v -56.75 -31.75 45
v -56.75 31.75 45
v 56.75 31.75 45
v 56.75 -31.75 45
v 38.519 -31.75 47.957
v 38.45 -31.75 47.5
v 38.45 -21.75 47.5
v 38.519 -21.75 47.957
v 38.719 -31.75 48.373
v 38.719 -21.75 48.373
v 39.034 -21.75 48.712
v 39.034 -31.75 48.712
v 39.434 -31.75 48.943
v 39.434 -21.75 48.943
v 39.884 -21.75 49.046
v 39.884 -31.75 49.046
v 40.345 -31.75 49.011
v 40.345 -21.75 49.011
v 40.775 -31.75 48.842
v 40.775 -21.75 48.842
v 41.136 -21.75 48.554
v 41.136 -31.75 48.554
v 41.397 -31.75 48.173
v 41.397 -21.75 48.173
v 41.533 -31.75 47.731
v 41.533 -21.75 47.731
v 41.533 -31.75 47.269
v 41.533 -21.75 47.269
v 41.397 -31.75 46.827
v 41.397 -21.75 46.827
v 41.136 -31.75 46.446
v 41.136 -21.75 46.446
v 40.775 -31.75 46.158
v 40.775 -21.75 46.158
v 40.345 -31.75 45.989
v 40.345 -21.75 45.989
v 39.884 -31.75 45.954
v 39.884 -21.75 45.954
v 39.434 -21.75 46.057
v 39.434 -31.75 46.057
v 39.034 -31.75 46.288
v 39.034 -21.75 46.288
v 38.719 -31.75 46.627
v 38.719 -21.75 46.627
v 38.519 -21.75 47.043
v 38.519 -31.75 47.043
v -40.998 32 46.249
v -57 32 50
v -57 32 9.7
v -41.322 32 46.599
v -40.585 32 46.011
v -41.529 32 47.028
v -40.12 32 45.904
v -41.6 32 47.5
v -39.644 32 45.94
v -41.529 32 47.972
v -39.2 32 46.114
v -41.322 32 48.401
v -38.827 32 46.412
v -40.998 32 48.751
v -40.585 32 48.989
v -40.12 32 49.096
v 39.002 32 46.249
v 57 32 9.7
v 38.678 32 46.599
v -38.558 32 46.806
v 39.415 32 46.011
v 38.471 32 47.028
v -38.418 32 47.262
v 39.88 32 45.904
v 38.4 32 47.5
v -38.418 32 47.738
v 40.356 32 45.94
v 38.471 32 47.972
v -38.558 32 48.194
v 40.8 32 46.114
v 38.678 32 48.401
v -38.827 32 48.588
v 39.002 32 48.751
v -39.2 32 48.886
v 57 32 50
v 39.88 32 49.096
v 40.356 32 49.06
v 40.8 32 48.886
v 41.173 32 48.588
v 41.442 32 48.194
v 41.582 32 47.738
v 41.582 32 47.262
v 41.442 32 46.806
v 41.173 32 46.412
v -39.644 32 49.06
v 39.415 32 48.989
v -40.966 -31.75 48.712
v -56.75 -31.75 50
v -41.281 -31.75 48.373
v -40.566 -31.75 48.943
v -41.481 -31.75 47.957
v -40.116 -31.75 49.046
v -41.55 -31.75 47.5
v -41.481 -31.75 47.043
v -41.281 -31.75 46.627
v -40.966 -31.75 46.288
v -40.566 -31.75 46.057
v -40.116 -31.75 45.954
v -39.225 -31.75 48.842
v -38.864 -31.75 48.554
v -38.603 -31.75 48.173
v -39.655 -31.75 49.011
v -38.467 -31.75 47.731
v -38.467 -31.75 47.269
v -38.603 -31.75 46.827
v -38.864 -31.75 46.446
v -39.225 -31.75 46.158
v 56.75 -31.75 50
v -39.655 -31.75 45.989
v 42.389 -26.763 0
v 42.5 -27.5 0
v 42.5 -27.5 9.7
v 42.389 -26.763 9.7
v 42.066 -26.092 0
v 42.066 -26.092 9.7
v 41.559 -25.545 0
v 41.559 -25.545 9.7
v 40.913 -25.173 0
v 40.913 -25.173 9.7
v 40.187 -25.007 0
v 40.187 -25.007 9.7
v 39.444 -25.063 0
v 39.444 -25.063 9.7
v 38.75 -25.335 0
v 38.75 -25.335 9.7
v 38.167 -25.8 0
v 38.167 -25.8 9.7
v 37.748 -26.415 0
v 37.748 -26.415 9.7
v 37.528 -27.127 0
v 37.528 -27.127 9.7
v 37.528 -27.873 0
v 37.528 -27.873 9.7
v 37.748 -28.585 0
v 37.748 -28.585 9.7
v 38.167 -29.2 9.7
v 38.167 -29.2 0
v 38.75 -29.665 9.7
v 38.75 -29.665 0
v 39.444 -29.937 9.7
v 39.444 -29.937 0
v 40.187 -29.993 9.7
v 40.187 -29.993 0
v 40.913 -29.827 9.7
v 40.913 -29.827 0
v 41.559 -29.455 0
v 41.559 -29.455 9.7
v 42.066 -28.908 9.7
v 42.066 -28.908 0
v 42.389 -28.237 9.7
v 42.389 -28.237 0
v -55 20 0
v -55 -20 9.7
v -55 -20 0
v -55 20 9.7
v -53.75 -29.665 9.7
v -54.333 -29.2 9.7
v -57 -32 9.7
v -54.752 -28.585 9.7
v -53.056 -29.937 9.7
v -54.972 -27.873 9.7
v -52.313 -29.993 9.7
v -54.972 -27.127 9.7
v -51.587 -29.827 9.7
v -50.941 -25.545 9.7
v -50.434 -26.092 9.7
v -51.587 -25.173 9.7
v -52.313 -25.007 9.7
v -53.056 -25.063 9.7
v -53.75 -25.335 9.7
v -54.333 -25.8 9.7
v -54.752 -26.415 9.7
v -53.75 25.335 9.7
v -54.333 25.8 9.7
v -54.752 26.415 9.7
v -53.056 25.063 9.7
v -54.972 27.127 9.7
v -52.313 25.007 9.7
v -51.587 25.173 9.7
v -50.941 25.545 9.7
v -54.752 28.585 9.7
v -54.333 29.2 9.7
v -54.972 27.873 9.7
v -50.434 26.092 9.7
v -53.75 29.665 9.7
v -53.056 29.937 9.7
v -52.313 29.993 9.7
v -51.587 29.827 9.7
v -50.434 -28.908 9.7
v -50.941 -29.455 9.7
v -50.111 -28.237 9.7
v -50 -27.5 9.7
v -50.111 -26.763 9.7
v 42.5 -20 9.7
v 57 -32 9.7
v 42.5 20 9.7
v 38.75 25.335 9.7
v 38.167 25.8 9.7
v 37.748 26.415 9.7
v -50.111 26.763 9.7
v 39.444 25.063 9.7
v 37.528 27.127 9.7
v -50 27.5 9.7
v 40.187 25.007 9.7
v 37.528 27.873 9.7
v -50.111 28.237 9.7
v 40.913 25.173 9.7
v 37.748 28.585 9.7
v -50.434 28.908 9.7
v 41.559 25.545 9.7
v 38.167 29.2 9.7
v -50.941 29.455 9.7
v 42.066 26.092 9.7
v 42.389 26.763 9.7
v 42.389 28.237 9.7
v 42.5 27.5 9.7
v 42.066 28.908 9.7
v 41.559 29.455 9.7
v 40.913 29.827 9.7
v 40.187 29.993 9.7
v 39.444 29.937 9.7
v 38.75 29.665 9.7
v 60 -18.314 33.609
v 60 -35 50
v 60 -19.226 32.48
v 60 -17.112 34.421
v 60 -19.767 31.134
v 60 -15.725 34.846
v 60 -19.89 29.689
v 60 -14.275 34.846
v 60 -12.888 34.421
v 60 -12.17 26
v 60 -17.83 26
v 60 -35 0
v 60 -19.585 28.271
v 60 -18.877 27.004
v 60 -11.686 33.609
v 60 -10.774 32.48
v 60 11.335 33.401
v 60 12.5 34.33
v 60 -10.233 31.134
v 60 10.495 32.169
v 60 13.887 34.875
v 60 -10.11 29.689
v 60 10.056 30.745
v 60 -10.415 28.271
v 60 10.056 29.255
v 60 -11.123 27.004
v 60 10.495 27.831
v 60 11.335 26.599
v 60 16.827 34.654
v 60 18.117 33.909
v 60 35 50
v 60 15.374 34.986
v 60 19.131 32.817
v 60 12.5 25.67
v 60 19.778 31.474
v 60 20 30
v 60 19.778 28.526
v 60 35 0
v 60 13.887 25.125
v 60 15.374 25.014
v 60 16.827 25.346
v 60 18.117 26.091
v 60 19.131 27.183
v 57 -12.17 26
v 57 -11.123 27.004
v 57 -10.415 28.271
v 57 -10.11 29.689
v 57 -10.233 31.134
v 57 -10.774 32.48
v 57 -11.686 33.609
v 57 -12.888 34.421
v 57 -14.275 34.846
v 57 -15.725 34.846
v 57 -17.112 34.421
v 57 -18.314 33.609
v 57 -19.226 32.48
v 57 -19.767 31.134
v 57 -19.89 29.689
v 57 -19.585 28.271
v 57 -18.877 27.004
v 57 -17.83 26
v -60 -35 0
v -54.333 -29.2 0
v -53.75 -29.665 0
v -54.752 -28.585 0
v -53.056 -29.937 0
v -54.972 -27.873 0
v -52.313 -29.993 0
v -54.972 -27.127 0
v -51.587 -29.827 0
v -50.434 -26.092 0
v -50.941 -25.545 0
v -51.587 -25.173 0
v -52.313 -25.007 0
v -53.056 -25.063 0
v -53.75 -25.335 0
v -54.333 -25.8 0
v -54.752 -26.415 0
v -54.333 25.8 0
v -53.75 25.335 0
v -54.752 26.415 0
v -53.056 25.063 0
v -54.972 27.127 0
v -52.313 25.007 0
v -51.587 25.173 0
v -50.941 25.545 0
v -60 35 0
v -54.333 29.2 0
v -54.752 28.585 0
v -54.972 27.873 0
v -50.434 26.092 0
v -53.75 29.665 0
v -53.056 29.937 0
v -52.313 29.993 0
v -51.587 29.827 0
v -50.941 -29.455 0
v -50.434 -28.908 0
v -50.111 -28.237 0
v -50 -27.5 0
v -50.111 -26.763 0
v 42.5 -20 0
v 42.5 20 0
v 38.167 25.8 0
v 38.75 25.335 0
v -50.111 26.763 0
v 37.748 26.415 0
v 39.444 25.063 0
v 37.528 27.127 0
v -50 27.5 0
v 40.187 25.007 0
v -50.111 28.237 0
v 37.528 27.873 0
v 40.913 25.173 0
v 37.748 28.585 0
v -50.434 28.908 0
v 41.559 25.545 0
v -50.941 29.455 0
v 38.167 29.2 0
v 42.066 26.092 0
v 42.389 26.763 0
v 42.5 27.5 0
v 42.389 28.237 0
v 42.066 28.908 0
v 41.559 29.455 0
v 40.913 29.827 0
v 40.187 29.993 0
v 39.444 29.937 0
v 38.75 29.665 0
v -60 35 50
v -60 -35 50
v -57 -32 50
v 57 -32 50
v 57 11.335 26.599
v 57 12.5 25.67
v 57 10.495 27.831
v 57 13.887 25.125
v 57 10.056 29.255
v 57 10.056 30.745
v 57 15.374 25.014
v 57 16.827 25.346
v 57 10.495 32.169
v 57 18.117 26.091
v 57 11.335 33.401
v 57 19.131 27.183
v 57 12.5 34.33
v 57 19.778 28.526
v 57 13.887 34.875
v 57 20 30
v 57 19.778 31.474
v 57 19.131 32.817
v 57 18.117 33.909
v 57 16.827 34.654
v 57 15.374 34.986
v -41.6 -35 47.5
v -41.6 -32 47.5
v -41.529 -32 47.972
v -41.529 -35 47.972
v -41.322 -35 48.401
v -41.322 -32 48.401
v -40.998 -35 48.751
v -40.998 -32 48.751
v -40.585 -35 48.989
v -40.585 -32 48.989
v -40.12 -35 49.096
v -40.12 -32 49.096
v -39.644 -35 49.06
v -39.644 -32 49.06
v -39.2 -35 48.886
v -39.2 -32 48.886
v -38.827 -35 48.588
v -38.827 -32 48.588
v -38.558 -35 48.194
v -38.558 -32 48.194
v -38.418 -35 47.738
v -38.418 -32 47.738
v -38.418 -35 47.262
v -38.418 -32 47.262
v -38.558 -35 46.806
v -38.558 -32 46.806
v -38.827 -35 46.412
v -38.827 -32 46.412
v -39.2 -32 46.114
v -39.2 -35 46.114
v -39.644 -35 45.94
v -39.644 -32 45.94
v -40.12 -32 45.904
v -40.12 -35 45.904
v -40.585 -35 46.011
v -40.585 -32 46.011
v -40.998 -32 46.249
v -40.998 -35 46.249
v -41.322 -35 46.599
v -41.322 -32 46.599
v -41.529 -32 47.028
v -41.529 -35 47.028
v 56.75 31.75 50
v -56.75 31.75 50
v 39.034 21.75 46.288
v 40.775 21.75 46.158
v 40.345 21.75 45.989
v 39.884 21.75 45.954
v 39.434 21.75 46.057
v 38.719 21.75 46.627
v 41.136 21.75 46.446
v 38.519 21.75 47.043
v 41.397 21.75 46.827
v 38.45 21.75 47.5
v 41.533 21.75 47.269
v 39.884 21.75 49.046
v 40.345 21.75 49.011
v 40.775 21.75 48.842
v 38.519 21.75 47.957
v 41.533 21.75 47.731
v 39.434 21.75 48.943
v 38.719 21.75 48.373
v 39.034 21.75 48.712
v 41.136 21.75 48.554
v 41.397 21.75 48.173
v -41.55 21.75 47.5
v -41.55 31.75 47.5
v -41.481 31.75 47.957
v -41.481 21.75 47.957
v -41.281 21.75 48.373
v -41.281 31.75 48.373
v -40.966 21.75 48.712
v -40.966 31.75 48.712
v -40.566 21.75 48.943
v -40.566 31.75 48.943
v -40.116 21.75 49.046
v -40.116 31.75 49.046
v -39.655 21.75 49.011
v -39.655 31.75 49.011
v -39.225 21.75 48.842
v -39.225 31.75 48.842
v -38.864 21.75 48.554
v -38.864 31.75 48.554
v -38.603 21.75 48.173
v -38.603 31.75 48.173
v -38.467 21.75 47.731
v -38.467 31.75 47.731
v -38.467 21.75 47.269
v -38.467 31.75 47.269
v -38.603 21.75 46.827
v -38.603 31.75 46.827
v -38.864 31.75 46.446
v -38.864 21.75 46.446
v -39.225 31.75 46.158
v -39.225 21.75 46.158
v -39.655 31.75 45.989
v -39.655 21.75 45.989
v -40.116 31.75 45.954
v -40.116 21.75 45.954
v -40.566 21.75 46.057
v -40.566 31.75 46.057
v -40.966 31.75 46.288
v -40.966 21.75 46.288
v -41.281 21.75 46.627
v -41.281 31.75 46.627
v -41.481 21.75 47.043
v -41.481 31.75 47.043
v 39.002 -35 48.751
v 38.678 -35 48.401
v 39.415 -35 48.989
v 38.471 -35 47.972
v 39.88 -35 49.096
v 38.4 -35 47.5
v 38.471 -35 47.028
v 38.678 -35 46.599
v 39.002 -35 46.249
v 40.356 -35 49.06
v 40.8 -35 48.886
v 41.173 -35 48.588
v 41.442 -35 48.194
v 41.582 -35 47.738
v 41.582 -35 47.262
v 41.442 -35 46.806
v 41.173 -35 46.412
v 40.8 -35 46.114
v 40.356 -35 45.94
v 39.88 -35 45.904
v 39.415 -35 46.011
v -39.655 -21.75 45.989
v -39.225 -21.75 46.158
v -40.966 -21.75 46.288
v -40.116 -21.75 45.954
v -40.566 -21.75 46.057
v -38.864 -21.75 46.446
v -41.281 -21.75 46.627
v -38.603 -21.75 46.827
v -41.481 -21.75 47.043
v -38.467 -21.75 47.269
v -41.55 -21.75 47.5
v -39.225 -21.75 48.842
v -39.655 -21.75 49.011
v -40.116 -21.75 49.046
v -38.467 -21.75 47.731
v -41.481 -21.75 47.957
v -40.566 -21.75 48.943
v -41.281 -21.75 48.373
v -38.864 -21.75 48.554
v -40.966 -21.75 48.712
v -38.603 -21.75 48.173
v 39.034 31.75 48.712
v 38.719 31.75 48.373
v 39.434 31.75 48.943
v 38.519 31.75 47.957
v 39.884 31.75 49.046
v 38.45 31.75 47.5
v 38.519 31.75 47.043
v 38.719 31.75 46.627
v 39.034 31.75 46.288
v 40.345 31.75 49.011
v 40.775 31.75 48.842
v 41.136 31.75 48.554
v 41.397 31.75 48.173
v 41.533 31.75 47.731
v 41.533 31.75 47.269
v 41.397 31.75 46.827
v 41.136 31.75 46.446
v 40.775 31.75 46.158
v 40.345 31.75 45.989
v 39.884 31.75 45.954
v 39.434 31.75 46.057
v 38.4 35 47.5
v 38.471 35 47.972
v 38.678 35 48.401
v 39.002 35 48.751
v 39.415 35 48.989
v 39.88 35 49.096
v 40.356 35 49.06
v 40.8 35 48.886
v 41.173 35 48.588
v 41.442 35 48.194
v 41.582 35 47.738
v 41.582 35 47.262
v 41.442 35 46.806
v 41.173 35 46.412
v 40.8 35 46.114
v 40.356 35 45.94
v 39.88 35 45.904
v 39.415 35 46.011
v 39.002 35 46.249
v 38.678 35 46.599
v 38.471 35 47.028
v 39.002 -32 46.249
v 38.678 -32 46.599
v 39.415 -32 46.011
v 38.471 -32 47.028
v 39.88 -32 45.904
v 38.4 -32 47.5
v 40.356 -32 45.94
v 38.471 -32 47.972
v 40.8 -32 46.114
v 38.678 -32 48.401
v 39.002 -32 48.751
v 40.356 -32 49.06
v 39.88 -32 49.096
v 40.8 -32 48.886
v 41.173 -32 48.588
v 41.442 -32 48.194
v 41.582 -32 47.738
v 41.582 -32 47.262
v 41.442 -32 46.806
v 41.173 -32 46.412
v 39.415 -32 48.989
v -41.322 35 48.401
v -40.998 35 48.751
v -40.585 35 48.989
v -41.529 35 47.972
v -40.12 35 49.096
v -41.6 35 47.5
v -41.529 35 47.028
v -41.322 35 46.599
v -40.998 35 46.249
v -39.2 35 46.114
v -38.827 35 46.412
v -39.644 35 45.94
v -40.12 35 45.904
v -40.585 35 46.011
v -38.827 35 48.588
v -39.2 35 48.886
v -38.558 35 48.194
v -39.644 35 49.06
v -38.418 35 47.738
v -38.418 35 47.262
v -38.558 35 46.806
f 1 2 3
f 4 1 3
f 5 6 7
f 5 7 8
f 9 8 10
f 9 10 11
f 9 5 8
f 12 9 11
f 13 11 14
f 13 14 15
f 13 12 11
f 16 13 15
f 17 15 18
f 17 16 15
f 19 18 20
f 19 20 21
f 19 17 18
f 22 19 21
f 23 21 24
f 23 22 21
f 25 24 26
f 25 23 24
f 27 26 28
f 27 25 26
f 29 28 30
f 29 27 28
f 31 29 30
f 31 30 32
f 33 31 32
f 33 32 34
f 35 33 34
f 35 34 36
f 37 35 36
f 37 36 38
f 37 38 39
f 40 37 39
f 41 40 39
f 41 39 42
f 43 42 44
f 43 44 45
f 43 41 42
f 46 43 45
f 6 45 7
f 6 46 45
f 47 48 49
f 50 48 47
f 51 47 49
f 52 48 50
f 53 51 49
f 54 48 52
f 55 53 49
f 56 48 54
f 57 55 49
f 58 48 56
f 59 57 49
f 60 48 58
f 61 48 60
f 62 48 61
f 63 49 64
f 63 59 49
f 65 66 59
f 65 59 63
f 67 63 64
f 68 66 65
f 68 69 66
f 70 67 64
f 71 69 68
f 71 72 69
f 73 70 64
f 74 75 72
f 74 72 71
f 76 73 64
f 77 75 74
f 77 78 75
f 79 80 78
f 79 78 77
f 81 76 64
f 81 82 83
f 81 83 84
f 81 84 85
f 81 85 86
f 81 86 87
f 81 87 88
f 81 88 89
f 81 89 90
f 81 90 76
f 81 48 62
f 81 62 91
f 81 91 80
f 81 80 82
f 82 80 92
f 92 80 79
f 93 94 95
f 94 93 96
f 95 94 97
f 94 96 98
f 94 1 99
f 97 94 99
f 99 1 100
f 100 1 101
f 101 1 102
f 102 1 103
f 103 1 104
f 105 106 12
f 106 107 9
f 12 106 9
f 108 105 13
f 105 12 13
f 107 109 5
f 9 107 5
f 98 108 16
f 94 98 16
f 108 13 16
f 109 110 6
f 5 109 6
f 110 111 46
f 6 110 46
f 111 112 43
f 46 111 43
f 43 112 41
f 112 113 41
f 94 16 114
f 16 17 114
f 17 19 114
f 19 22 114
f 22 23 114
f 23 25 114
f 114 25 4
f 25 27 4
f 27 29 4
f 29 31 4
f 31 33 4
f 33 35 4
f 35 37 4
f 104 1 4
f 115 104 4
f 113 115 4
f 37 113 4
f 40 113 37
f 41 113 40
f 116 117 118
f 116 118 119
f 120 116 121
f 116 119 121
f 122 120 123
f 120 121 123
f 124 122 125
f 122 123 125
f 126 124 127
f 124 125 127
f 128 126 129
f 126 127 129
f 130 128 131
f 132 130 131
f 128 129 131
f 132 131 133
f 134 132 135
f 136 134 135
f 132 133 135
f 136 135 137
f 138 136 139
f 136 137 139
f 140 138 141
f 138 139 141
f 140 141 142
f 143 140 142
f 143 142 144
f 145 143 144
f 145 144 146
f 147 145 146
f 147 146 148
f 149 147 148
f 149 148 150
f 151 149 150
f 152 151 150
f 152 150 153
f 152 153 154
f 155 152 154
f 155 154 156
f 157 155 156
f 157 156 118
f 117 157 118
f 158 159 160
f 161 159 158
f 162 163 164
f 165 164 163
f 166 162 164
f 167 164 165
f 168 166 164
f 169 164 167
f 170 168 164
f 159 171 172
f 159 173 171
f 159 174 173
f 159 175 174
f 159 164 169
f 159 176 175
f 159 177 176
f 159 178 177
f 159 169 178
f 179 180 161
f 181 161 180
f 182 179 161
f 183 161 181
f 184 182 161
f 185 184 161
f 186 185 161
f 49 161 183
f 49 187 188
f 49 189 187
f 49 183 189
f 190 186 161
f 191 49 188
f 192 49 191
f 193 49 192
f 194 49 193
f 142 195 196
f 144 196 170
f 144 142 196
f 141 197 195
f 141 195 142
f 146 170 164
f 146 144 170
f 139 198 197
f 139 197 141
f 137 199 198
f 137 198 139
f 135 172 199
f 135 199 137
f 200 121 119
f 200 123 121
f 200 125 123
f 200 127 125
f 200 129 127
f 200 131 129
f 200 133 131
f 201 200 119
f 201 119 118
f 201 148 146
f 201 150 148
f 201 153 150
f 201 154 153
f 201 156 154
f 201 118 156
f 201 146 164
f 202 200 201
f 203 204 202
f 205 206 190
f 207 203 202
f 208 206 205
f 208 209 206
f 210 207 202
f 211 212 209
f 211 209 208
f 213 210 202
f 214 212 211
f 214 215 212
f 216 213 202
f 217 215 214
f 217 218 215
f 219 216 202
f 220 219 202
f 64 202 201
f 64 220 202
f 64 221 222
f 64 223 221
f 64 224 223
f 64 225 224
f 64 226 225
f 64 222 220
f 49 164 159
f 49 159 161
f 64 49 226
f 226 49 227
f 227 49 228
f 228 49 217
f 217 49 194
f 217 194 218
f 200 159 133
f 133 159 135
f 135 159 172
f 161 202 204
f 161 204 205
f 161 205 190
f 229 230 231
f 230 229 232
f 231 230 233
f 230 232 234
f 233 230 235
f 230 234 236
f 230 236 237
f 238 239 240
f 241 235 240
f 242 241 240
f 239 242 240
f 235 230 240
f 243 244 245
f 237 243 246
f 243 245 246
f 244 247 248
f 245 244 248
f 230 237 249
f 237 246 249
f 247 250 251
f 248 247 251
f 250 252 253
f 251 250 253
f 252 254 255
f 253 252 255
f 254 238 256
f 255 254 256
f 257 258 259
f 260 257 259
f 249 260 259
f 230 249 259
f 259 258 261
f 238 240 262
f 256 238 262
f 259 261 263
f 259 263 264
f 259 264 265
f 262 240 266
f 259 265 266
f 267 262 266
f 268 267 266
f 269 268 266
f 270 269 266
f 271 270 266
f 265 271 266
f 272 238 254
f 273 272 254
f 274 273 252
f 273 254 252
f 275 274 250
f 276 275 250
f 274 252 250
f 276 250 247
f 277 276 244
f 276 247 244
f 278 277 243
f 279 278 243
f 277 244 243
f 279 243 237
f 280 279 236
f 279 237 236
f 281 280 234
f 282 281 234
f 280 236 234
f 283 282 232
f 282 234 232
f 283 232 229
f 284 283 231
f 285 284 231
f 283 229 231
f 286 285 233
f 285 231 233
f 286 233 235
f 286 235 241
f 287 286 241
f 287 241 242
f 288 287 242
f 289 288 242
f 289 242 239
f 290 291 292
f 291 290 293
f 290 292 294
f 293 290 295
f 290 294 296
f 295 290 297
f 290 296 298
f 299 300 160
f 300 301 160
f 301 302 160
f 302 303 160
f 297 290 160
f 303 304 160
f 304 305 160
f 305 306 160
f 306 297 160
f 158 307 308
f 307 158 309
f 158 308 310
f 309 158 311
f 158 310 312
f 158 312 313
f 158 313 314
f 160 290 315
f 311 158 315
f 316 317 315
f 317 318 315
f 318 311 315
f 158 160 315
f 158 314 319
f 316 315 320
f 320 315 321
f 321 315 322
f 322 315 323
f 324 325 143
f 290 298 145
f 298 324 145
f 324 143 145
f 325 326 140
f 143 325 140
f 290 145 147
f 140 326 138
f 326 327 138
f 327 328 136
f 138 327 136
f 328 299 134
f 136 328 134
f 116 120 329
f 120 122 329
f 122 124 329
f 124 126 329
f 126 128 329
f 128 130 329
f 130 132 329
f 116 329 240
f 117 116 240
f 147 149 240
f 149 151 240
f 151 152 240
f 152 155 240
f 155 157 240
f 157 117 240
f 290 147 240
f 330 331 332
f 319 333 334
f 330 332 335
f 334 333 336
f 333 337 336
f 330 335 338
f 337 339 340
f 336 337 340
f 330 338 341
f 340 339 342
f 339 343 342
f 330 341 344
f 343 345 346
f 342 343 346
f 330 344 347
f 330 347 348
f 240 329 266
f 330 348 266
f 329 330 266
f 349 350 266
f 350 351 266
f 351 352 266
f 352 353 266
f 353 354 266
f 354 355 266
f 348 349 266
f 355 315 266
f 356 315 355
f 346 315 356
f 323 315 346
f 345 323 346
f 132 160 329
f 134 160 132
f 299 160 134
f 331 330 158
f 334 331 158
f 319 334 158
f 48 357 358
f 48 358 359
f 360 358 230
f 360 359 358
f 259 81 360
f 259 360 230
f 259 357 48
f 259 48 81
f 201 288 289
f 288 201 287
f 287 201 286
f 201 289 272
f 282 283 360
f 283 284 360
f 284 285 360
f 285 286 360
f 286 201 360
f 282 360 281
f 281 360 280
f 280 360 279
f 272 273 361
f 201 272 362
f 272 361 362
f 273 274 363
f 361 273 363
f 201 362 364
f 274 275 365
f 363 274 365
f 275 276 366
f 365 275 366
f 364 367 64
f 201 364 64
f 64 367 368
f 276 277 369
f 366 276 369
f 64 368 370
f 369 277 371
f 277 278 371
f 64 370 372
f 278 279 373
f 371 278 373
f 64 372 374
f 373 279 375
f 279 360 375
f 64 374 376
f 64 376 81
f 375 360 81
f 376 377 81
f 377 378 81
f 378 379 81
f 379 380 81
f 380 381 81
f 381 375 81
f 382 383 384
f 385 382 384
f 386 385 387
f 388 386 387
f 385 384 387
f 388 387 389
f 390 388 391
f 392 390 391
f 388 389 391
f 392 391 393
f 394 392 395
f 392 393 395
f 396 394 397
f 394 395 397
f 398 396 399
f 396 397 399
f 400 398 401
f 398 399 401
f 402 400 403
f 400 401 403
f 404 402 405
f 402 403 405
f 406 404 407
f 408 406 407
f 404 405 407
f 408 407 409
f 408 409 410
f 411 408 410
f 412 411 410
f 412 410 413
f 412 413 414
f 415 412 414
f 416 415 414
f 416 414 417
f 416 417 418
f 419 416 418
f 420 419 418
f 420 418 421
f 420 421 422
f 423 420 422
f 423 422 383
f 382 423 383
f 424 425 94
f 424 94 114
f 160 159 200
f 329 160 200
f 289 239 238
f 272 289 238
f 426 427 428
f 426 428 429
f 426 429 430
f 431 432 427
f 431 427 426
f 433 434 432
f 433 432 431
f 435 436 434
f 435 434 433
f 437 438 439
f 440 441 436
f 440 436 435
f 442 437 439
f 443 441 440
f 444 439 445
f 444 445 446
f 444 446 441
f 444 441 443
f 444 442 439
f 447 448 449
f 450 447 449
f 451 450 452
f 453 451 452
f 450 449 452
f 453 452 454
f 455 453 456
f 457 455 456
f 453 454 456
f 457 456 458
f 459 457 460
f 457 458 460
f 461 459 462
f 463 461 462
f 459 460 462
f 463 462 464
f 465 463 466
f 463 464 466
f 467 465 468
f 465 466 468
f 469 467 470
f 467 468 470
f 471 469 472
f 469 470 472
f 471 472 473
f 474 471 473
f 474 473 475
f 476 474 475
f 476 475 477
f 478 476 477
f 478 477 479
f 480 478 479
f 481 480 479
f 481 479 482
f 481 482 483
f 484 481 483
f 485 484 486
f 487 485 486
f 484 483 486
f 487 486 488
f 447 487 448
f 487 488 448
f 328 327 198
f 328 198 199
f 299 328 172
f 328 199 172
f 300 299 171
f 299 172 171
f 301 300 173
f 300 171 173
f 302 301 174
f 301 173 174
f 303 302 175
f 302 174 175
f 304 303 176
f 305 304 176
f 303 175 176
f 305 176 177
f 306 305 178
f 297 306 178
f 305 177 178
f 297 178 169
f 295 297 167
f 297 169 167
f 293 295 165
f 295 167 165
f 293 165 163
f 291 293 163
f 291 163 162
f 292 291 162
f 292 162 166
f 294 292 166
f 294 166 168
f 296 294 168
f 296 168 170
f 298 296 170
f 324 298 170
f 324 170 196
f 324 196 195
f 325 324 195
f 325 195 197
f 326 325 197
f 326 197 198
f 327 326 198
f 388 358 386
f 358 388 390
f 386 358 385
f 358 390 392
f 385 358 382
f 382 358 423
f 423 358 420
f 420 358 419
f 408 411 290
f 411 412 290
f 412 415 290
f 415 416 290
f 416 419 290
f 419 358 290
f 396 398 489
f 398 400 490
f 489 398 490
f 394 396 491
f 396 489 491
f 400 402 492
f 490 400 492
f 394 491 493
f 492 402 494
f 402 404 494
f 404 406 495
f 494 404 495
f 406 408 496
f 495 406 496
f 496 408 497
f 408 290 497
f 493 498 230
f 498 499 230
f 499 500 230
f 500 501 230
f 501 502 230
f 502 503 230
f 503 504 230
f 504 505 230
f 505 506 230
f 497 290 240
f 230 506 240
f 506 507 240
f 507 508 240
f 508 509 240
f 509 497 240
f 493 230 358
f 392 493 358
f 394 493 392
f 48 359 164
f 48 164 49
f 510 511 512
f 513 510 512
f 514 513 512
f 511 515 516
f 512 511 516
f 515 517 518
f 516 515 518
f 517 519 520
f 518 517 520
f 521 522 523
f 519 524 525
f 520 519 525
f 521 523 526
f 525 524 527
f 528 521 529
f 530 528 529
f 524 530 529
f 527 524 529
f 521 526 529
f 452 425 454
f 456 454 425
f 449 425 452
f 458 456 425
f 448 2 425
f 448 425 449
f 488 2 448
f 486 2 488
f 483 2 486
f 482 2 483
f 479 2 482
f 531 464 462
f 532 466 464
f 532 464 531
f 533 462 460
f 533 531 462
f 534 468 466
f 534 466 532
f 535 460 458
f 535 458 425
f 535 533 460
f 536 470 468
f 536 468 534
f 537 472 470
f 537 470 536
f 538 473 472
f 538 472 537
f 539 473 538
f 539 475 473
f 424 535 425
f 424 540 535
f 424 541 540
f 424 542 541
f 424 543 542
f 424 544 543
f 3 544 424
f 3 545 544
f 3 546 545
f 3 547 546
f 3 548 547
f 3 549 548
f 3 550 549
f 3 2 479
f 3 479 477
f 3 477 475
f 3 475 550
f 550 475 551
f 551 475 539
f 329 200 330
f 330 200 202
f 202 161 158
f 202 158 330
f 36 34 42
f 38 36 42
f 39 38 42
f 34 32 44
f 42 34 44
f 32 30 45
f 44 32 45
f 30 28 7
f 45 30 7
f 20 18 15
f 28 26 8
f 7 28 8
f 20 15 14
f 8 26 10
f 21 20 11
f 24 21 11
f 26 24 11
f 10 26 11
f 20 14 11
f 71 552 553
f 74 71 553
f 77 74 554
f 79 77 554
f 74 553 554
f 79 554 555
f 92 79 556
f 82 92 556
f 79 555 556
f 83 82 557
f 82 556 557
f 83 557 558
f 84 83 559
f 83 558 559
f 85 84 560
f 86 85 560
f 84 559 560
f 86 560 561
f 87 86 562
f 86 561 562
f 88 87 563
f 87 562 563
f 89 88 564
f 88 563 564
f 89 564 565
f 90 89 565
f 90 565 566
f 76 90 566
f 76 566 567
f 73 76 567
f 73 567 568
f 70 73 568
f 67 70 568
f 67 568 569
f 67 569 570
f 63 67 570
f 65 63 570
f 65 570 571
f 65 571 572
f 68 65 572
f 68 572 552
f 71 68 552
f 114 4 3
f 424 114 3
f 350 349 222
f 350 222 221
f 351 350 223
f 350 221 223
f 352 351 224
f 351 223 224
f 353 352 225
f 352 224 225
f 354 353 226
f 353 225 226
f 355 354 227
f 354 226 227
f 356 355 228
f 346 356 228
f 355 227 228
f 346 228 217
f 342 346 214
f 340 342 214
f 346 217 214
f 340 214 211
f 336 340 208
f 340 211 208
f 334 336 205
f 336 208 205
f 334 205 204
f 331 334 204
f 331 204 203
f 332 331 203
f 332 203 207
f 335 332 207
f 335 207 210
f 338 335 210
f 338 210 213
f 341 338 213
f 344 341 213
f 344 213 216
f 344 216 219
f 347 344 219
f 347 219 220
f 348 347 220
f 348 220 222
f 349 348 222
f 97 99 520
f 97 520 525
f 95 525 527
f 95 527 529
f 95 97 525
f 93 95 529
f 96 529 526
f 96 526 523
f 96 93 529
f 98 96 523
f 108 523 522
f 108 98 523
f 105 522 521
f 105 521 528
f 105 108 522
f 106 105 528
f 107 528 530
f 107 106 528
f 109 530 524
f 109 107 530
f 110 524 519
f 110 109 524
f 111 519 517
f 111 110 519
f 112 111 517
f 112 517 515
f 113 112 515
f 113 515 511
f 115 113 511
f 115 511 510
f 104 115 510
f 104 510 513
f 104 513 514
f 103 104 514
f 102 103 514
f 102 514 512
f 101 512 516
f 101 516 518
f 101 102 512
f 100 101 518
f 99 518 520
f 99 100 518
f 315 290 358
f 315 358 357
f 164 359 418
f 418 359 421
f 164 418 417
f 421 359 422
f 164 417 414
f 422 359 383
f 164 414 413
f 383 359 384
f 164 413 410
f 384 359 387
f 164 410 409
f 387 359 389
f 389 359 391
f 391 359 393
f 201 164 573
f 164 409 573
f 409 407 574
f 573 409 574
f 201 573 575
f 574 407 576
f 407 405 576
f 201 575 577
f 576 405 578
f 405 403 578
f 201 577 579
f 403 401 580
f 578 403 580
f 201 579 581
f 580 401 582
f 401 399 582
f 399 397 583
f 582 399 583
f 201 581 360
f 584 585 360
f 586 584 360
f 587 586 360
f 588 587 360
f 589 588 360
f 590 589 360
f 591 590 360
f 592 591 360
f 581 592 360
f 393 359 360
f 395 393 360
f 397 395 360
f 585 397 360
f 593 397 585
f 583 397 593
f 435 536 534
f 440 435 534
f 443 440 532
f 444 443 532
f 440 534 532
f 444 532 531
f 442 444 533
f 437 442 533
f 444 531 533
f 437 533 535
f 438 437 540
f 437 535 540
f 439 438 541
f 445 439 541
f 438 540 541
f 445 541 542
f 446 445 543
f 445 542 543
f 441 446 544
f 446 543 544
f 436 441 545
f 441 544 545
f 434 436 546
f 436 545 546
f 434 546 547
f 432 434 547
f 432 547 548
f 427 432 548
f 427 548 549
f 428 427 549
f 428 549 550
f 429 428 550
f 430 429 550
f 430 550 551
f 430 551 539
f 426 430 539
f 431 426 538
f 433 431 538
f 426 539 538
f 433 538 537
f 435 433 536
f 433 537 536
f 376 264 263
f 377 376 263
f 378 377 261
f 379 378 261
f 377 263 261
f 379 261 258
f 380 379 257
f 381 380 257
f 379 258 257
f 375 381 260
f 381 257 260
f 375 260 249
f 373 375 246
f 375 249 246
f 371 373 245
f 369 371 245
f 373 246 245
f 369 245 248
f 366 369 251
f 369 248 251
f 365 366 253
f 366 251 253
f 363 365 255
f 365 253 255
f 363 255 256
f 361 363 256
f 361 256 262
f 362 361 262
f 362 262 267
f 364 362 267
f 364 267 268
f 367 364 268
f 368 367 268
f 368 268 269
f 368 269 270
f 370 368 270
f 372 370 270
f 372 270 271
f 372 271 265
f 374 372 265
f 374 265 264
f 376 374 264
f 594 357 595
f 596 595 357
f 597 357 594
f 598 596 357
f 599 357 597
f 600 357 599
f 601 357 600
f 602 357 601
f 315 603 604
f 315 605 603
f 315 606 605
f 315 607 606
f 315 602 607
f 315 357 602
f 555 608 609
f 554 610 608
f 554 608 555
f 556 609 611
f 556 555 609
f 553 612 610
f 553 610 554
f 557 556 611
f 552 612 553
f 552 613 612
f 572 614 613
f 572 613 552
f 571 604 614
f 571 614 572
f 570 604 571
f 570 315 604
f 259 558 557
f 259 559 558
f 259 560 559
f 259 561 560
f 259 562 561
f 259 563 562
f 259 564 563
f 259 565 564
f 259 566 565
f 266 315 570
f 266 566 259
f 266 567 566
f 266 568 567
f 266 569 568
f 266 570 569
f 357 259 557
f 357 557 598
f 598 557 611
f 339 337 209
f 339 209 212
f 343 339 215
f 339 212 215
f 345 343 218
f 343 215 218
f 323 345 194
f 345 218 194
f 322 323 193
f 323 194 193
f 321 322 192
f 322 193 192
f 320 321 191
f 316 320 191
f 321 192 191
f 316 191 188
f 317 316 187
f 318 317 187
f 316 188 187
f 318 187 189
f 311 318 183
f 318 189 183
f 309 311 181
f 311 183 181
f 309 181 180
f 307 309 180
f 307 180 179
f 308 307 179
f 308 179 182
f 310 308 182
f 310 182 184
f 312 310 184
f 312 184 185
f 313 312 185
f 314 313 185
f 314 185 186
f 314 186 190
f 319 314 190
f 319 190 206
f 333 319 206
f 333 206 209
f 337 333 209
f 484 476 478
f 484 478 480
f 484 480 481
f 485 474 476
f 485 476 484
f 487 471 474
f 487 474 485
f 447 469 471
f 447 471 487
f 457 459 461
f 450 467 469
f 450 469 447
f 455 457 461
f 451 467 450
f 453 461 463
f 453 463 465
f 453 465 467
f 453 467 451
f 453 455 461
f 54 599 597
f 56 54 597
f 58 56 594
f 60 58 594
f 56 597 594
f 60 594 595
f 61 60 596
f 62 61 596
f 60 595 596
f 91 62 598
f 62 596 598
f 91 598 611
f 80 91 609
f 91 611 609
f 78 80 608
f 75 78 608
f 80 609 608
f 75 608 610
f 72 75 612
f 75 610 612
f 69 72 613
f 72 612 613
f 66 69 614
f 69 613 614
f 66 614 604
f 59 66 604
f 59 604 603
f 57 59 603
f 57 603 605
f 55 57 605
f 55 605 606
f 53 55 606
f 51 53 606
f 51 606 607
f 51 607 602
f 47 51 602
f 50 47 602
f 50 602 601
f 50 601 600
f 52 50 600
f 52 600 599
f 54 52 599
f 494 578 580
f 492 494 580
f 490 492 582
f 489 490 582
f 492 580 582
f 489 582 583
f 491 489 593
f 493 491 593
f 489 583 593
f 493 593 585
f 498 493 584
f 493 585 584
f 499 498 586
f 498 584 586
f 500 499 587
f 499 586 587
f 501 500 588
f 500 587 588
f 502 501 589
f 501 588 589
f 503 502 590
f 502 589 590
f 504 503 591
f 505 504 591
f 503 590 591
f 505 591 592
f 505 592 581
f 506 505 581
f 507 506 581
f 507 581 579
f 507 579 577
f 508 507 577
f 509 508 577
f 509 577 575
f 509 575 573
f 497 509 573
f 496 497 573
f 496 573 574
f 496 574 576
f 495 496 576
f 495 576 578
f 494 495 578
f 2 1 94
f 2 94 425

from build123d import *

# Parameters (mm, degrees)
SKETCH_W        = 120
SKETCH_H        = 70
PAD_DEPTH       = 50
SKETCH001_W     = 114
SKETCH001_H     = 64
POCKET_DEPTH    = 40.3
SKETCH002_R     = 2.5
SKETCH002_W     = 97.5
SKETCH002_H     = 40
POCKET001_DEPTH = 9.701
SKETCH003_R     = 5
POCKET002_DEPTH = 5
SKETCH005_R     = 1.6
POCKET003_DEPTH = 70.001
SKETCH004_W     = 113.5
SKETCH004_H     = 63.5
PAD001_DEPTH    = 5
SKETCH006_R     = 1.55
POCKET004_DEPTH = 10


with BuildPart() as box:
    # Sketch → Pad (new body)
    with BuildSketch(Plane.XY):
        Rectangle(SKETCH_W, SKETCH_H)
    extrude(amount=PAD_DEPTH)

    # Sketch001 (on Face6 of Pad) → Pocket (cut)
    with BuildSketch(Plane.XY.offset(50)):
        Rectangle(SKETCH001_W, SKETCH001_H)
    extrude(amount=-POCKET_DEPTH, mode=Mode.SUBTRACT)

    # Sketch002 (on Face11 of Pocket) → Pocket001 (cut, through all)
    with BuildSketch(Plane.XY.offset(9.7)):
        with Locations((-52.5, -27.5)):
            Circle(SKETCH002_R)
        with Locations((-52.5, 27.5)):
            Circle(SKETCH002_R)
        with Locations((40, 27.5)):
            Circle(SKETCH002_R)
        with Locations((40, -27.5)):
            Circle(SKETCH002_R)
        with Locations((-6.25, 0)):
            Rectangle(SKETCH002_W, SKETCH002_H)
    extrude(amount=-POCKET001_DEPTH, mode=Mode.SUBTRACT)

    # Sketch003 (on Face6 of Pocket001) → Pocket002 (cut)
    with BuildSketch(Plane.YZ.offset(60)):
        with Locations((15, 30)):
            Circle(SKETCH003_R)
        with BuildLine():
            ThreePointArc((-12.169806, 26), (-15, 34.9), (-17.830194, 26))
            Line((-17.830194, 26), (-12.169806, 26))
        make_face()
    extrude(amount=-POCKET002_DEPTH, mode=Mode.SUBTRACT)

    # Sketch005 (on Face2 of Pocket002) → Pocket003 (cut, through all)
    with BuildSketch(Plane(origin=(0, 35, 0), x_dir=(-1, 0, 0), z_dir=(0, 1, 0))):
        with Locations((40, 47.5)):
            Circle(SKETCH005_R)
        with Locations((-40, 47.5)):
            Circle(SKETCH005_R)
    extrude(amount=-POCKET003_DEPTH, mode=Mode.SUBTRACT)


with BuildPart() as cover:
    # Sketch004 → Pad001 (new body)
    with BuildSketch(Plane.XY):
        Rectangle(SKETCH004_W, SKETCH004_H)
    extrude(amount=PAD001_DEPTH)

    # Sketch006 (on Face4 of Pad001) → Pocket004 (cut)
    with BuildSketch(Plane(origin=(0, 31.75, 0), x_dir=(-1, 0, 0), z_dir=(0, 1, 0))):
        with Locations((-40, 2.5)):
            Circle(SKETCH006_R)
        with Locations((40, 2.5)):
            Circle(SKETCH006_R)
    pocket004 = extrude(amount=-POCKET004_DEPTH, mode=Mode.SUBTRACT)

    # Mirrored: Pocket004 across XZ
    add(pocket004.mirror(Plane.XZ), mode=Mode.SUBTRACT)


with BuildPart() as cover_1:
    # Body001 placement: moved
    add(cover.part.moved(Location((0, 0, 45))))


solid = Compound([box.part, cover_1.part])
